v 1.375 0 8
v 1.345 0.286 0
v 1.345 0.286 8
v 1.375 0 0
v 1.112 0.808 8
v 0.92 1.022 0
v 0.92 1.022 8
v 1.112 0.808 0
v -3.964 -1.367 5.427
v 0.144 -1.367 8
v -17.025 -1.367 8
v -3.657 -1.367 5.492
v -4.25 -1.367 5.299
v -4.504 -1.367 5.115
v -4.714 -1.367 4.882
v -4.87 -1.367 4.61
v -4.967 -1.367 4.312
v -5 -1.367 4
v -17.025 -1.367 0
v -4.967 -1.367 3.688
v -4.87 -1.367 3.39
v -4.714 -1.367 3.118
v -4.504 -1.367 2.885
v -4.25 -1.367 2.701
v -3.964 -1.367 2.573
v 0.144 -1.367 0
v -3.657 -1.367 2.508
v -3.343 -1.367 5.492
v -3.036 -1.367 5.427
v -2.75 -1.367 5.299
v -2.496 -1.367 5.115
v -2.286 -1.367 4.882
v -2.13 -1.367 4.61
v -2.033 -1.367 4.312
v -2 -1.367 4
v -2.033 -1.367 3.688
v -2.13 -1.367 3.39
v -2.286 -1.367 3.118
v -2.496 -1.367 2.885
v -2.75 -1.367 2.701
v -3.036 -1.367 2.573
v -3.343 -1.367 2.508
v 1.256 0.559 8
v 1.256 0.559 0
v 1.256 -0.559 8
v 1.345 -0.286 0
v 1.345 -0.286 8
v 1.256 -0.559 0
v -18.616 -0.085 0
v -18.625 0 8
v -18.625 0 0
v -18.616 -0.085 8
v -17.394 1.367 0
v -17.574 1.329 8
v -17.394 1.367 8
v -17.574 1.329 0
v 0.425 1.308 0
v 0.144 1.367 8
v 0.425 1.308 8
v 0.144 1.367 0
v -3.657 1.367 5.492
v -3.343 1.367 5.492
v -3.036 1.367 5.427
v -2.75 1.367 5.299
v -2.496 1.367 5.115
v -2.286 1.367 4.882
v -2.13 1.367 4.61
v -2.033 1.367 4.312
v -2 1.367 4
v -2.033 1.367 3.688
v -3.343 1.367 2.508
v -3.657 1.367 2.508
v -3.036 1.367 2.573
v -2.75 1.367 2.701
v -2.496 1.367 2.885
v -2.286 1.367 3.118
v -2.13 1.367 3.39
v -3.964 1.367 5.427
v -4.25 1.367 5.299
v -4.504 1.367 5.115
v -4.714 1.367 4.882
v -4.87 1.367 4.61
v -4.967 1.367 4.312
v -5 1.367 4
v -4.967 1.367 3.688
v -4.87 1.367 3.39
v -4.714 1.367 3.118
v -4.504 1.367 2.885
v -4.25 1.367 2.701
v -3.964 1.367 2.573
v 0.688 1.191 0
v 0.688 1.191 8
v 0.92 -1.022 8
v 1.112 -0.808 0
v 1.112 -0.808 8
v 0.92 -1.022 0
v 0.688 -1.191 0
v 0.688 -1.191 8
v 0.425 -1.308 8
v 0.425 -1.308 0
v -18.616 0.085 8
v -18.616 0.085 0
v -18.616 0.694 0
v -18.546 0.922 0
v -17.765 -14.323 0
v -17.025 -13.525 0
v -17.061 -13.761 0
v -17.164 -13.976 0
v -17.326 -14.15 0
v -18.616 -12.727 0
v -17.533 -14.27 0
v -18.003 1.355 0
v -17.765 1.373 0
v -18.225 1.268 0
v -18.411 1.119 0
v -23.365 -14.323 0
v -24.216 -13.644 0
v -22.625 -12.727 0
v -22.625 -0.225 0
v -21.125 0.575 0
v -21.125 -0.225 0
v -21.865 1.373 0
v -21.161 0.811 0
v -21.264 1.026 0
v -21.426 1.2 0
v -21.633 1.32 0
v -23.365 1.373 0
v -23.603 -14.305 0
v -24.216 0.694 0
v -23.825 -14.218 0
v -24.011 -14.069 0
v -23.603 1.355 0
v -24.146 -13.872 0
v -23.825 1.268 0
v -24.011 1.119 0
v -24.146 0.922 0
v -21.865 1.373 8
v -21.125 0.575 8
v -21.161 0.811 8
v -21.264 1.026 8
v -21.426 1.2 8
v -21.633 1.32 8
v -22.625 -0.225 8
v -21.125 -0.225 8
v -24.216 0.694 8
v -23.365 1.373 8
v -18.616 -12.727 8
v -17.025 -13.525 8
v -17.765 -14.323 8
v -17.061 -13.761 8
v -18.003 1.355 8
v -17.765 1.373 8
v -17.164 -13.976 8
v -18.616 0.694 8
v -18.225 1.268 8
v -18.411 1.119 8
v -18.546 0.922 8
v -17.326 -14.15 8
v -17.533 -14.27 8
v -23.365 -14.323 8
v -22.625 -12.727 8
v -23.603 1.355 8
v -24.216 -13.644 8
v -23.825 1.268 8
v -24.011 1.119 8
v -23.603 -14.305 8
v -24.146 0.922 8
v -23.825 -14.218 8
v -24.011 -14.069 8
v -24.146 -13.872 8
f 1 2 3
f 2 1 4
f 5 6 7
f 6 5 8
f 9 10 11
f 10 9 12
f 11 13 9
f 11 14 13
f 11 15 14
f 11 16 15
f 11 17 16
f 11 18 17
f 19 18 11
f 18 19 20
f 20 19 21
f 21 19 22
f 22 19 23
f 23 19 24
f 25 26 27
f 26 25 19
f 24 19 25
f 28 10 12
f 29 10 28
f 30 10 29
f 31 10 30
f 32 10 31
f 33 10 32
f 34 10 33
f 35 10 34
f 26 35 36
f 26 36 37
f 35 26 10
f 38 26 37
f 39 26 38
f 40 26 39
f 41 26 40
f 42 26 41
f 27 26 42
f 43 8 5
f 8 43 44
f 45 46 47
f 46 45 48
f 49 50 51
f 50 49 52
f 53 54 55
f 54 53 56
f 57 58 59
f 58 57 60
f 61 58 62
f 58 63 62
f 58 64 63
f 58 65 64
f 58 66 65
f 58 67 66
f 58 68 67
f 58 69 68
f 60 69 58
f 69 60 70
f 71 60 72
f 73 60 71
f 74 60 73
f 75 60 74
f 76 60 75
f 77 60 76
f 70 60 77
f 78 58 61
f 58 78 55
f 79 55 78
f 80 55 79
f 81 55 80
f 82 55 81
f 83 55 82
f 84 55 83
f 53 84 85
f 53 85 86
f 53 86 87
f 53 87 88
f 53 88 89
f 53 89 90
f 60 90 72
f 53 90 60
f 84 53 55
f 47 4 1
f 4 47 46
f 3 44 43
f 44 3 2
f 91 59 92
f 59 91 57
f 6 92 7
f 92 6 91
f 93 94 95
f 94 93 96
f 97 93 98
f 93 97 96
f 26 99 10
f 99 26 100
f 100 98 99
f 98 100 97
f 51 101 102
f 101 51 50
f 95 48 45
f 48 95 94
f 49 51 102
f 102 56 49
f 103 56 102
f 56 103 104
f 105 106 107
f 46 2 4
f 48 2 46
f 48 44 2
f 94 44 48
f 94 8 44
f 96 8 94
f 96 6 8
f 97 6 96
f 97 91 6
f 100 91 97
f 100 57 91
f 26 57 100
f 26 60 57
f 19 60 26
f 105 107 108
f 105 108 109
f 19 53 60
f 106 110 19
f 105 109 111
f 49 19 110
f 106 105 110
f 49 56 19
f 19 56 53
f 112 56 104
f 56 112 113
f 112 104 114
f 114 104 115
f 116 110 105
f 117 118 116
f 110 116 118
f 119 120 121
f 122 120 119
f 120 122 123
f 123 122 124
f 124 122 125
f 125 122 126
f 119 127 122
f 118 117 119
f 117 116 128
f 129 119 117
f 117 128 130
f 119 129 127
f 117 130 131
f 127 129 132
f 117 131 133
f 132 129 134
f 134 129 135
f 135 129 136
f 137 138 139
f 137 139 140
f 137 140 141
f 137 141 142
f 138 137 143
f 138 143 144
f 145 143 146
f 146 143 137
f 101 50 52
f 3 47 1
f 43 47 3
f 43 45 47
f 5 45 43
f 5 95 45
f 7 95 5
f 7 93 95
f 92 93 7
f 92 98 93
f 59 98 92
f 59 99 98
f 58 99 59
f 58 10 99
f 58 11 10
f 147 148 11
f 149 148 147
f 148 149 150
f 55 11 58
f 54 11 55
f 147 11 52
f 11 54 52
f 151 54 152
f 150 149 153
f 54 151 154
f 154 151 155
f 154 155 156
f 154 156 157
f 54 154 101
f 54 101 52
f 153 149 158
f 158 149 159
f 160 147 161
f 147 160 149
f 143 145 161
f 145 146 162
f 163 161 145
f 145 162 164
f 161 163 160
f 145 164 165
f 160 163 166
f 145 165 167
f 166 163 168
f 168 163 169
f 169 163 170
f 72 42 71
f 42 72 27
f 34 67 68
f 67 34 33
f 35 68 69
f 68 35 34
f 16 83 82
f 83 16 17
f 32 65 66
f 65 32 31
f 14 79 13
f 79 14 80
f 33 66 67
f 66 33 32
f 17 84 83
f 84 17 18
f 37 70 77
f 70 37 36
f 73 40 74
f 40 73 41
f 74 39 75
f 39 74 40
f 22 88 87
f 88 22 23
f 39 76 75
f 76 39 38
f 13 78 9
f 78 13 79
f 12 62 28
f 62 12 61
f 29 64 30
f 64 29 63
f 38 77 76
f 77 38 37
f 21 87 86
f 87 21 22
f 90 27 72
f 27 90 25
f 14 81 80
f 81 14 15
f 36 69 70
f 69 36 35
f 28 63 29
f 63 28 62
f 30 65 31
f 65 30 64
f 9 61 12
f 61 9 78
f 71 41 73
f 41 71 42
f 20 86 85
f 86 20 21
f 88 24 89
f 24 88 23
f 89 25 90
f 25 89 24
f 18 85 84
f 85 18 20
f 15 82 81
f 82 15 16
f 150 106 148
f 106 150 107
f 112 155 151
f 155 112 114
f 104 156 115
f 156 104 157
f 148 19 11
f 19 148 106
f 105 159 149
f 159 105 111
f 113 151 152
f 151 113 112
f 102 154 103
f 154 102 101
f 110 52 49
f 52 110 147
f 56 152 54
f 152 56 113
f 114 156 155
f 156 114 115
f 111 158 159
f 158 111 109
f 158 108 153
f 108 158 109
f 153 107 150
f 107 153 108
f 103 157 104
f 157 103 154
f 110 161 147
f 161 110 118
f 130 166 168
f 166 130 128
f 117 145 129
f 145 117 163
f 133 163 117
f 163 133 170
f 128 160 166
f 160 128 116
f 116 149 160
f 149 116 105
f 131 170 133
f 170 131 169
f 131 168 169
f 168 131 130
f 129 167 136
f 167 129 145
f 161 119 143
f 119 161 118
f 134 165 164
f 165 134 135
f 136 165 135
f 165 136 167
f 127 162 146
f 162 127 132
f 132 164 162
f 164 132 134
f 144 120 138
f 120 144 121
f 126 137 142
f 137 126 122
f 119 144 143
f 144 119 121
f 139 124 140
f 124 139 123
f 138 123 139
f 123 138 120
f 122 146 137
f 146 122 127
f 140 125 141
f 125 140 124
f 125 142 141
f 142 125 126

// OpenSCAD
// Master options.
$fs=0.25;// Need fine resolution for a part this small.
depth = 8;

// Retaining wall options.
retaining_wall_thickness = 2.75 / 2; // radius!
retaining_wall_length = 20;
retaining_hole_radius = 1.5;
retaining_hole_offset = 2;

// Bracket options.
angle = 0;
wall_thickness = 0.8; // radius!
strip_height = 12.5;
strip_depth = 4;
gap = 2.5;

one = [0, 0, 0];
two = one + [-(retaining_wall_length - wall_thickness - retaining_wall_thickness), 0, 0];
three = [0, -(strip_height + 2*wall_thickness), 0];
four = three + [-(strip_depth + 2*wall_thickness), 0, 0];
five = four + [0, strip_height + 2*wall_thickness, 0];
six = five + [strip_depth - gap, 0, 0];

union(){
    // Ledge hook
    difference(){
        hull(){
            translate(one){
                cylinder(h=depth, r=retaining_wall_thickness);
            }
            translate(two + [+retaining_wall_thickness - wall_thickness, 0, 0]){
                cylinder(h=depth, r=retaining_wall_thickness);
            }
        }

        translate([-retaining_hole_radius - retaining_hole_offset, 2*retaining_wall_thickness, depth / 2]){
            rotate([90, 0, 0]){
                cylinder(h=4*retaining_wall_thickness, r=retaining_hole_radius);
            }
        }
    }

    // LED strip bracket
    translate(two + [0, retaining_wall_thickness - wall_thickness, 0]){
        rotate([0, 0, angle]){
            hull(){
                translate(one){
                    cylinder(h=depth, r=wall_thickness);
                }
                translate(three){
                    cylinder(h=depth, r=wall_thickness);
                }
            }

            hull(){
                translate(three){
                    cylinder(h=depth, r=wall_thickness);
                }
                translate(four){
                    cylinder(h=depth, r=wall_thickness);
                }
            }

            hull(){
                translate(four){
                    cylinder(h=depth, r=wall_thickness);
                }
                translate(five){
                    cylinder(h=depth, r=wall_thickness);
                }
            }

            hull(){
                translate(five){
                    cylinder(h=depth, r=wall_thickness);
                }
                translate(six){
                    union(){
                        cylinder(h=depth, r=wall_thickness);
                        translate([-wall_thickness, -wall_thickness, 0]){
                            cube([2 * wall_thickness, wall_thickness, depth], false);
                        }
                    }
                }
            }
        }
    }
}
